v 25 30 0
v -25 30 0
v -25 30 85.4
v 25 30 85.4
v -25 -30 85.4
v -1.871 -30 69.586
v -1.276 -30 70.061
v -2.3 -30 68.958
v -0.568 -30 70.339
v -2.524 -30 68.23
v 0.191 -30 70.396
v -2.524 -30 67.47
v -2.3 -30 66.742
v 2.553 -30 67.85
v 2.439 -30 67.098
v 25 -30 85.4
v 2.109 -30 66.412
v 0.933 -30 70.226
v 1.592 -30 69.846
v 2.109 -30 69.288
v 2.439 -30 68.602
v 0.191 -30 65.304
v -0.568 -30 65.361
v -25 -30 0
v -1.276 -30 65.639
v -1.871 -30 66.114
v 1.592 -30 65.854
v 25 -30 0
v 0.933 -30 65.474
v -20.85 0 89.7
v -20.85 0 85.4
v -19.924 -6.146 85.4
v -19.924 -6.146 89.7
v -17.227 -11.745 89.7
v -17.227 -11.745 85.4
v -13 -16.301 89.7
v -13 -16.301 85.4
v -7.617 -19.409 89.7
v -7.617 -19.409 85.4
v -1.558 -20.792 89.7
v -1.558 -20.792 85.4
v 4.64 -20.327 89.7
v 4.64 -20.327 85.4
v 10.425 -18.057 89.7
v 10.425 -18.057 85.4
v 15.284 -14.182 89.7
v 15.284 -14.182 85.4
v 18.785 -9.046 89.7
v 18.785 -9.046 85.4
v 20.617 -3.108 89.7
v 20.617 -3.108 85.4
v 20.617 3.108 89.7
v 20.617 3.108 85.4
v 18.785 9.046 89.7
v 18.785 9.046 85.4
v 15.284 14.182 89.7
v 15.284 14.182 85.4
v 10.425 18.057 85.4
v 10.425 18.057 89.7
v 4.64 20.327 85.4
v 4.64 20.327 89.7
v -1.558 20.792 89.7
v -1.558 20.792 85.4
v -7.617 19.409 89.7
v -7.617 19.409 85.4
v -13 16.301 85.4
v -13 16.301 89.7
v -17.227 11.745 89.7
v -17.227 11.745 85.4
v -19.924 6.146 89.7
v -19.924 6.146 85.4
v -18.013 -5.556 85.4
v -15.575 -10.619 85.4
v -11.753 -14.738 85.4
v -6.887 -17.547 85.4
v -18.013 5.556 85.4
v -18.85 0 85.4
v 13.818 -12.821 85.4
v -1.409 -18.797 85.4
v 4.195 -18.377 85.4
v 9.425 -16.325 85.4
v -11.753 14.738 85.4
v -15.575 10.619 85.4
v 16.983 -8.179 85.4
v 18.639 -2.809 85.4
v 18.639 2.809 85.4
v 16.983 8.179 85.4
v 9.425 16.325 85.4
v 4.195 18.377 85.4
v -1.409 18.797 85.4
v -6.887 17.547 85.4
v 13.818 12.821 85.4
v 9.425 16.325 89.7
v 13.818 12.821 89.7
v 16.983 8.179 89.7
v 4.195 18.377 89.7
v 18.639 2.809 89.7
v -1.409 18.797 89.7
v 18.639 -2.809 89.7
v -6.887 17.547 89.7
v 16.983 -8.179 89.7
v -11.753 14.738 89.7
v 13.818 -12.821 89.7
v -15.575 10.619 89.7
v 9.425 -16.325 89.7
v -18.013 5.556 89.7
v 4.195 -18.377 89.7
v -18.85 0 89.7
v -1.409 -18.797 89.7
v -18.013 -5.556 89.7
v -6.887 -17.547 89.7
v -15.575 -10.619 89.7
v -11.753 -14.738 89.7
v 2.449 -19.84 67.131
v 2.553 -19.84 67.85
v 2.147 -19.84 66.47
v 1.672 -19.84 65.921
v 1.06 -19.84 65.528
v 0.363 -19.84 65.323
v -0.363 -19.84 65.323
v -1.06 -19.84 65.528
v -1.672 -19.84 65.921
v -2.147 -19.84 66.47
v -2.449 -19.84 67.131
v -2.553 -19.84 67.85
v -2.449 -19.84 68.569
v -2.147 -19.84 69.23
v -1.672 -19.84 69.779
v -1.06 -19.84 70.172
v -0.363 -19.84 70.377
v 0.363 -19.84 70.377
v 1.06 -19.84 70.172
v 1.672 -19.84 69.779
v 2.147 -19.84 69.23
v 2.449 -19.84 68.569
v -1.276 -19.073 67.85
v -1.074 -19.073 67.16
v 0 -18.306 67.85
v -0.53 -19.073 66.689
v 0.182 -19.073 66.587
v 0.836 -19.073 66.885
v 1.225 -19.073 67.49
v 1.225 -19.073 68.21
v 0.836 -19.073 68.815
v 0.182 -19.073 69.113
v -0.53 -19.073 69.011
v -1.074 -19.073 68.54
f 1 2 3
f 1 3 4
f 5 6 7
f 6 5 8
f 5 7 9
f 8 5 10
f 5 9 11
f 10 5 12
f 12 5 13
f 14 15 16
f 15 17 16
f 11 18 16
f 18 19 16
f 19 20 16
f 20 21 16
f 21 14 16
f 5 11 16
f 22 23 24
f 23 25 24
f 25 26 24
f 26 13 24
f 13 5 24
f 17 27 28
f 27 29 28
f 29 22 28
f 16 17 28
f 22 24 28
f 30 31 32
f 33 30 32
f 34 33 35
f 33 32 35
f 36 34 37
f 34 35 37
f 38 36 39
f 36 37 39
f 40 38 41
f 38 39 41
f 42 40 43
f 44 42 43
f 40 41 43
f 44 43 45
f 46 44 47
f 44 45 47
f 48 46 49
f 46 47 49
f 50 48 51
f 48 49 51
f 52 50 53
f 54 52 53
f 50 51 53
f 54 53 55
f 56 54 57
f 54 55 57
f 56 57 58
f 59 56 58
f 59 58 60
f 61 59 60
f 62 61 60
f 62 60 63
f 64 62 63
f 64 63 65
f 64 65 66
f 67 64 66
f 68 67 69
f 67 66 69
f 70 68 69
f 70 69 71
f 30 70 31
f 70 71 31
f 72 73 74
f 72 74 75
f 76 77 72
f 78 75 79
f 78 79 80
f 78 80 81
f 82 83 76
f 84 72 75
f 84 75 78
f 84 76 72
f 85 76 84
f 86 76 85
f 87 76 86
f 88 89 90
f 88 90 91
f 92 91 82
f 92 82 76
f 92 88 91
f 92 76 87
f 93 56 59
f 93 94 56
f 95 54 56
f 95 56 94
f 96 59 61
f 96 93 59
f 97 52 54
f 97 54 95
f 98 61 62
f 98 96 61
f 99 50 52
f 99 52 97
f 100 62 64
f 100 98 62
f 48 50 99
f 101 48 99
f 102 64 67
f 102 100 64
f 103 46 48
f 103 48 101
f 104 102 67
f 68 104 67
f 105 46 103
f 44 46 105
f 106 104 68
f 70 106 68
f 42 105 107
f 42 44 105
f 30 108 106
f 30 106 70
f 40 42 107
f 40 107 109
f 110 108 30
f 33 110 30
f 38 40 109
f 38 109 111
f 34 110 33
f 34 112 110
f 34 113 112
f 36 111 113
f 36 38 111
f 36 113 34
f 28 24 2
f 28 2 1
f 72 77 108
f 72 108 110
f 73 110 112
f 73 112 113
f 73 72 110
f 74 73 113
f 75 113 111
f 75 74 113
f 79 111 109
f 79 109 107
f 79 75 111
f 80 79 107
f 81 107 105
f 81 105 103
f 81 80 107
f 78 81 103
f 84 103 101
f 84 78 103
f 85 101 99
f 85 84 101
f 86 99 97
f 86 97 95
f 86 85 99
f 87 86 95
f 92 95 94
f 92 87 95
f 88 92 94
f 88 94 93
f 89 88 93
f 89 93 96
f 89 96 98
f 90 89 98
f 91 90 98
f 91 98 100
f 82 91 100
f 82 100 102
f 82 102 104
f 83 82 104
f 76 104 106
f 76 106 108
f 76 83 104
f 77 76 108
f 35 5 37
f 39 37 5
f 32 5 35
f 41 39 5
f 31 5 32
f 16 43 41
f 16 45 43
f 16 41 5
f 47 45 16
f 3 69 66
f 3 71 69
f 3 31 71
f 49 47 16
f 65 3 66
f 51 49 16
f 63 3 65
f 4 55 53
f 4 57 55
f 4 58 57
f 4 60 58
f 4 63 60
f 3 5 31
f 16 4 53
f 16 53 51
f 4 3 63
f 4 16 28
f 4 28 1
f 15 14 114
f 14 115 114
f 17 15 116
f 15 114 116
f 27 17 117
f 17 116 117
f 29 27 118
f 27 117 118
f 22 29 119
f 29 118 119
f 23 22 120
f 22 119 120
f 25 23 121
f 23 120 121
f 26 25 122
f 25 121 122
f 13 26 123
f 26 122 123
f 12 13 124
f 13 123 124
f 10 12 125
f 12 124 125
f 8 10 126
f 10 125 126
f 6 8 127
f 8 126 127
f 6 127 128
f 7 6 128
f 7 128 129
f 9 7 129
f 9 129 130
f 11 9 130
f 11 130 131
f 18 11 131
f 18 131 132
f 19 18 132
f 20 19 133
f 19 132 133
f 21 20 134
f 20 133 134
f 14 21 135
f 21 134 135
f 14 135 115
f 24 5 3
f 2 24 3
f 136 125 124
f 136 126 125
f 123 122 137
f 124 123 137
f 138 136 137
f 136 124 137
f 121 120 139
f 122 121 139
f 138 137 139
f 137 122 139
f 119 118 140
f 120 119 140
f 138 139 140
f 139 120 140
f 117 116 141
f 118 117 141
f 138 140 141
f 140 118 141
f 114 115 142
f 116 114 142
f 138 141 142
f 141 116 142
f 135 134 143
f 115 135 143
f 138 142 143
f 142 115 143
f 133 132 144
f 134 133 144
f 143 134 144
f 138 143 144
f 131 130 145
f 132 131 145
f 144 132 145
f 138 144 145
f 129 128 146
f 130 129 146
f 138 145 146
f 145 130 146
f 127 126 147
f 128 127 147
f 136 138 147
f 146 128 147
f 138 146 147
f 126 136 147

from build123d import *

# Parameters (mm, degrees)
SKETCH1_W                   = 50
SKETCH1_H                   = 60
BOSS_EXTRUDE1_DEPTH         = 85.4
SKETCH2_R                   = 20.85
SKETCH2_R_2                 = 18.85
BOSS_EXTRUDE2_DEPTH         = 4.3
F_1_4_20_TAPPED_HOLE1_D     = 5.1054
F_1_4_20_TAPPED_HOLE1_DEPTH = 10.16
F_1_4_20_TAPPED_HOLE1_TIP   = 1.533816902


with BuildPart() as part:
    # Sketch1 → Boss-Extrude1 (new body)
    with BuildSketch(Plane.XY):
        Rectangle(SKETCH1_W, SKETCH1_H)
    extrude(amount=BOSS_EXTRUDE1_DEPTH)

    # Sketch2 → Boss-Extrude2 (add)
    with BuildSketch(Plane.XY.offset(85.4)):
        with Locations(Location((0, 0, 0), (0, 0, 180))):
            Circle(SKETCH2_R)
        with Locations(Location((0, 0, 0), (0, 0, 180))):
            Circle(SKETCH2_R_2, mode=Mode.SUBTRACT)
    extrude(amount=BOSS_EXTRUDE2_DEPTH)

    # 1/4-20 Tapped Hole1
    with Locations(Plane(origin=(0, -30, 0), x_dir=(-1, 0, 0), z_dir=(0, -1, 0))):
        with Locations((0, -67.85)):
            Hole(F_1_4_20_TAPPED_HOLE1_D / 2, depth=F_1_4_20_TAPPED_HOLE1_DEPTH)
            with Locations((0, 0, -(F_1_4_20_TAPPED_HOLE1_DEPTH + F_1_4_20_TAPPED_HOLE1_TIP / 2))):  # 118° drill point
                Cone(0, F_1_4_20_TAPPED_HOLE1_D / 2, F_1_4_20_TAPPED_HOLE1_TIP, mode=Mode.SUBTRACT)


solid = part.part
